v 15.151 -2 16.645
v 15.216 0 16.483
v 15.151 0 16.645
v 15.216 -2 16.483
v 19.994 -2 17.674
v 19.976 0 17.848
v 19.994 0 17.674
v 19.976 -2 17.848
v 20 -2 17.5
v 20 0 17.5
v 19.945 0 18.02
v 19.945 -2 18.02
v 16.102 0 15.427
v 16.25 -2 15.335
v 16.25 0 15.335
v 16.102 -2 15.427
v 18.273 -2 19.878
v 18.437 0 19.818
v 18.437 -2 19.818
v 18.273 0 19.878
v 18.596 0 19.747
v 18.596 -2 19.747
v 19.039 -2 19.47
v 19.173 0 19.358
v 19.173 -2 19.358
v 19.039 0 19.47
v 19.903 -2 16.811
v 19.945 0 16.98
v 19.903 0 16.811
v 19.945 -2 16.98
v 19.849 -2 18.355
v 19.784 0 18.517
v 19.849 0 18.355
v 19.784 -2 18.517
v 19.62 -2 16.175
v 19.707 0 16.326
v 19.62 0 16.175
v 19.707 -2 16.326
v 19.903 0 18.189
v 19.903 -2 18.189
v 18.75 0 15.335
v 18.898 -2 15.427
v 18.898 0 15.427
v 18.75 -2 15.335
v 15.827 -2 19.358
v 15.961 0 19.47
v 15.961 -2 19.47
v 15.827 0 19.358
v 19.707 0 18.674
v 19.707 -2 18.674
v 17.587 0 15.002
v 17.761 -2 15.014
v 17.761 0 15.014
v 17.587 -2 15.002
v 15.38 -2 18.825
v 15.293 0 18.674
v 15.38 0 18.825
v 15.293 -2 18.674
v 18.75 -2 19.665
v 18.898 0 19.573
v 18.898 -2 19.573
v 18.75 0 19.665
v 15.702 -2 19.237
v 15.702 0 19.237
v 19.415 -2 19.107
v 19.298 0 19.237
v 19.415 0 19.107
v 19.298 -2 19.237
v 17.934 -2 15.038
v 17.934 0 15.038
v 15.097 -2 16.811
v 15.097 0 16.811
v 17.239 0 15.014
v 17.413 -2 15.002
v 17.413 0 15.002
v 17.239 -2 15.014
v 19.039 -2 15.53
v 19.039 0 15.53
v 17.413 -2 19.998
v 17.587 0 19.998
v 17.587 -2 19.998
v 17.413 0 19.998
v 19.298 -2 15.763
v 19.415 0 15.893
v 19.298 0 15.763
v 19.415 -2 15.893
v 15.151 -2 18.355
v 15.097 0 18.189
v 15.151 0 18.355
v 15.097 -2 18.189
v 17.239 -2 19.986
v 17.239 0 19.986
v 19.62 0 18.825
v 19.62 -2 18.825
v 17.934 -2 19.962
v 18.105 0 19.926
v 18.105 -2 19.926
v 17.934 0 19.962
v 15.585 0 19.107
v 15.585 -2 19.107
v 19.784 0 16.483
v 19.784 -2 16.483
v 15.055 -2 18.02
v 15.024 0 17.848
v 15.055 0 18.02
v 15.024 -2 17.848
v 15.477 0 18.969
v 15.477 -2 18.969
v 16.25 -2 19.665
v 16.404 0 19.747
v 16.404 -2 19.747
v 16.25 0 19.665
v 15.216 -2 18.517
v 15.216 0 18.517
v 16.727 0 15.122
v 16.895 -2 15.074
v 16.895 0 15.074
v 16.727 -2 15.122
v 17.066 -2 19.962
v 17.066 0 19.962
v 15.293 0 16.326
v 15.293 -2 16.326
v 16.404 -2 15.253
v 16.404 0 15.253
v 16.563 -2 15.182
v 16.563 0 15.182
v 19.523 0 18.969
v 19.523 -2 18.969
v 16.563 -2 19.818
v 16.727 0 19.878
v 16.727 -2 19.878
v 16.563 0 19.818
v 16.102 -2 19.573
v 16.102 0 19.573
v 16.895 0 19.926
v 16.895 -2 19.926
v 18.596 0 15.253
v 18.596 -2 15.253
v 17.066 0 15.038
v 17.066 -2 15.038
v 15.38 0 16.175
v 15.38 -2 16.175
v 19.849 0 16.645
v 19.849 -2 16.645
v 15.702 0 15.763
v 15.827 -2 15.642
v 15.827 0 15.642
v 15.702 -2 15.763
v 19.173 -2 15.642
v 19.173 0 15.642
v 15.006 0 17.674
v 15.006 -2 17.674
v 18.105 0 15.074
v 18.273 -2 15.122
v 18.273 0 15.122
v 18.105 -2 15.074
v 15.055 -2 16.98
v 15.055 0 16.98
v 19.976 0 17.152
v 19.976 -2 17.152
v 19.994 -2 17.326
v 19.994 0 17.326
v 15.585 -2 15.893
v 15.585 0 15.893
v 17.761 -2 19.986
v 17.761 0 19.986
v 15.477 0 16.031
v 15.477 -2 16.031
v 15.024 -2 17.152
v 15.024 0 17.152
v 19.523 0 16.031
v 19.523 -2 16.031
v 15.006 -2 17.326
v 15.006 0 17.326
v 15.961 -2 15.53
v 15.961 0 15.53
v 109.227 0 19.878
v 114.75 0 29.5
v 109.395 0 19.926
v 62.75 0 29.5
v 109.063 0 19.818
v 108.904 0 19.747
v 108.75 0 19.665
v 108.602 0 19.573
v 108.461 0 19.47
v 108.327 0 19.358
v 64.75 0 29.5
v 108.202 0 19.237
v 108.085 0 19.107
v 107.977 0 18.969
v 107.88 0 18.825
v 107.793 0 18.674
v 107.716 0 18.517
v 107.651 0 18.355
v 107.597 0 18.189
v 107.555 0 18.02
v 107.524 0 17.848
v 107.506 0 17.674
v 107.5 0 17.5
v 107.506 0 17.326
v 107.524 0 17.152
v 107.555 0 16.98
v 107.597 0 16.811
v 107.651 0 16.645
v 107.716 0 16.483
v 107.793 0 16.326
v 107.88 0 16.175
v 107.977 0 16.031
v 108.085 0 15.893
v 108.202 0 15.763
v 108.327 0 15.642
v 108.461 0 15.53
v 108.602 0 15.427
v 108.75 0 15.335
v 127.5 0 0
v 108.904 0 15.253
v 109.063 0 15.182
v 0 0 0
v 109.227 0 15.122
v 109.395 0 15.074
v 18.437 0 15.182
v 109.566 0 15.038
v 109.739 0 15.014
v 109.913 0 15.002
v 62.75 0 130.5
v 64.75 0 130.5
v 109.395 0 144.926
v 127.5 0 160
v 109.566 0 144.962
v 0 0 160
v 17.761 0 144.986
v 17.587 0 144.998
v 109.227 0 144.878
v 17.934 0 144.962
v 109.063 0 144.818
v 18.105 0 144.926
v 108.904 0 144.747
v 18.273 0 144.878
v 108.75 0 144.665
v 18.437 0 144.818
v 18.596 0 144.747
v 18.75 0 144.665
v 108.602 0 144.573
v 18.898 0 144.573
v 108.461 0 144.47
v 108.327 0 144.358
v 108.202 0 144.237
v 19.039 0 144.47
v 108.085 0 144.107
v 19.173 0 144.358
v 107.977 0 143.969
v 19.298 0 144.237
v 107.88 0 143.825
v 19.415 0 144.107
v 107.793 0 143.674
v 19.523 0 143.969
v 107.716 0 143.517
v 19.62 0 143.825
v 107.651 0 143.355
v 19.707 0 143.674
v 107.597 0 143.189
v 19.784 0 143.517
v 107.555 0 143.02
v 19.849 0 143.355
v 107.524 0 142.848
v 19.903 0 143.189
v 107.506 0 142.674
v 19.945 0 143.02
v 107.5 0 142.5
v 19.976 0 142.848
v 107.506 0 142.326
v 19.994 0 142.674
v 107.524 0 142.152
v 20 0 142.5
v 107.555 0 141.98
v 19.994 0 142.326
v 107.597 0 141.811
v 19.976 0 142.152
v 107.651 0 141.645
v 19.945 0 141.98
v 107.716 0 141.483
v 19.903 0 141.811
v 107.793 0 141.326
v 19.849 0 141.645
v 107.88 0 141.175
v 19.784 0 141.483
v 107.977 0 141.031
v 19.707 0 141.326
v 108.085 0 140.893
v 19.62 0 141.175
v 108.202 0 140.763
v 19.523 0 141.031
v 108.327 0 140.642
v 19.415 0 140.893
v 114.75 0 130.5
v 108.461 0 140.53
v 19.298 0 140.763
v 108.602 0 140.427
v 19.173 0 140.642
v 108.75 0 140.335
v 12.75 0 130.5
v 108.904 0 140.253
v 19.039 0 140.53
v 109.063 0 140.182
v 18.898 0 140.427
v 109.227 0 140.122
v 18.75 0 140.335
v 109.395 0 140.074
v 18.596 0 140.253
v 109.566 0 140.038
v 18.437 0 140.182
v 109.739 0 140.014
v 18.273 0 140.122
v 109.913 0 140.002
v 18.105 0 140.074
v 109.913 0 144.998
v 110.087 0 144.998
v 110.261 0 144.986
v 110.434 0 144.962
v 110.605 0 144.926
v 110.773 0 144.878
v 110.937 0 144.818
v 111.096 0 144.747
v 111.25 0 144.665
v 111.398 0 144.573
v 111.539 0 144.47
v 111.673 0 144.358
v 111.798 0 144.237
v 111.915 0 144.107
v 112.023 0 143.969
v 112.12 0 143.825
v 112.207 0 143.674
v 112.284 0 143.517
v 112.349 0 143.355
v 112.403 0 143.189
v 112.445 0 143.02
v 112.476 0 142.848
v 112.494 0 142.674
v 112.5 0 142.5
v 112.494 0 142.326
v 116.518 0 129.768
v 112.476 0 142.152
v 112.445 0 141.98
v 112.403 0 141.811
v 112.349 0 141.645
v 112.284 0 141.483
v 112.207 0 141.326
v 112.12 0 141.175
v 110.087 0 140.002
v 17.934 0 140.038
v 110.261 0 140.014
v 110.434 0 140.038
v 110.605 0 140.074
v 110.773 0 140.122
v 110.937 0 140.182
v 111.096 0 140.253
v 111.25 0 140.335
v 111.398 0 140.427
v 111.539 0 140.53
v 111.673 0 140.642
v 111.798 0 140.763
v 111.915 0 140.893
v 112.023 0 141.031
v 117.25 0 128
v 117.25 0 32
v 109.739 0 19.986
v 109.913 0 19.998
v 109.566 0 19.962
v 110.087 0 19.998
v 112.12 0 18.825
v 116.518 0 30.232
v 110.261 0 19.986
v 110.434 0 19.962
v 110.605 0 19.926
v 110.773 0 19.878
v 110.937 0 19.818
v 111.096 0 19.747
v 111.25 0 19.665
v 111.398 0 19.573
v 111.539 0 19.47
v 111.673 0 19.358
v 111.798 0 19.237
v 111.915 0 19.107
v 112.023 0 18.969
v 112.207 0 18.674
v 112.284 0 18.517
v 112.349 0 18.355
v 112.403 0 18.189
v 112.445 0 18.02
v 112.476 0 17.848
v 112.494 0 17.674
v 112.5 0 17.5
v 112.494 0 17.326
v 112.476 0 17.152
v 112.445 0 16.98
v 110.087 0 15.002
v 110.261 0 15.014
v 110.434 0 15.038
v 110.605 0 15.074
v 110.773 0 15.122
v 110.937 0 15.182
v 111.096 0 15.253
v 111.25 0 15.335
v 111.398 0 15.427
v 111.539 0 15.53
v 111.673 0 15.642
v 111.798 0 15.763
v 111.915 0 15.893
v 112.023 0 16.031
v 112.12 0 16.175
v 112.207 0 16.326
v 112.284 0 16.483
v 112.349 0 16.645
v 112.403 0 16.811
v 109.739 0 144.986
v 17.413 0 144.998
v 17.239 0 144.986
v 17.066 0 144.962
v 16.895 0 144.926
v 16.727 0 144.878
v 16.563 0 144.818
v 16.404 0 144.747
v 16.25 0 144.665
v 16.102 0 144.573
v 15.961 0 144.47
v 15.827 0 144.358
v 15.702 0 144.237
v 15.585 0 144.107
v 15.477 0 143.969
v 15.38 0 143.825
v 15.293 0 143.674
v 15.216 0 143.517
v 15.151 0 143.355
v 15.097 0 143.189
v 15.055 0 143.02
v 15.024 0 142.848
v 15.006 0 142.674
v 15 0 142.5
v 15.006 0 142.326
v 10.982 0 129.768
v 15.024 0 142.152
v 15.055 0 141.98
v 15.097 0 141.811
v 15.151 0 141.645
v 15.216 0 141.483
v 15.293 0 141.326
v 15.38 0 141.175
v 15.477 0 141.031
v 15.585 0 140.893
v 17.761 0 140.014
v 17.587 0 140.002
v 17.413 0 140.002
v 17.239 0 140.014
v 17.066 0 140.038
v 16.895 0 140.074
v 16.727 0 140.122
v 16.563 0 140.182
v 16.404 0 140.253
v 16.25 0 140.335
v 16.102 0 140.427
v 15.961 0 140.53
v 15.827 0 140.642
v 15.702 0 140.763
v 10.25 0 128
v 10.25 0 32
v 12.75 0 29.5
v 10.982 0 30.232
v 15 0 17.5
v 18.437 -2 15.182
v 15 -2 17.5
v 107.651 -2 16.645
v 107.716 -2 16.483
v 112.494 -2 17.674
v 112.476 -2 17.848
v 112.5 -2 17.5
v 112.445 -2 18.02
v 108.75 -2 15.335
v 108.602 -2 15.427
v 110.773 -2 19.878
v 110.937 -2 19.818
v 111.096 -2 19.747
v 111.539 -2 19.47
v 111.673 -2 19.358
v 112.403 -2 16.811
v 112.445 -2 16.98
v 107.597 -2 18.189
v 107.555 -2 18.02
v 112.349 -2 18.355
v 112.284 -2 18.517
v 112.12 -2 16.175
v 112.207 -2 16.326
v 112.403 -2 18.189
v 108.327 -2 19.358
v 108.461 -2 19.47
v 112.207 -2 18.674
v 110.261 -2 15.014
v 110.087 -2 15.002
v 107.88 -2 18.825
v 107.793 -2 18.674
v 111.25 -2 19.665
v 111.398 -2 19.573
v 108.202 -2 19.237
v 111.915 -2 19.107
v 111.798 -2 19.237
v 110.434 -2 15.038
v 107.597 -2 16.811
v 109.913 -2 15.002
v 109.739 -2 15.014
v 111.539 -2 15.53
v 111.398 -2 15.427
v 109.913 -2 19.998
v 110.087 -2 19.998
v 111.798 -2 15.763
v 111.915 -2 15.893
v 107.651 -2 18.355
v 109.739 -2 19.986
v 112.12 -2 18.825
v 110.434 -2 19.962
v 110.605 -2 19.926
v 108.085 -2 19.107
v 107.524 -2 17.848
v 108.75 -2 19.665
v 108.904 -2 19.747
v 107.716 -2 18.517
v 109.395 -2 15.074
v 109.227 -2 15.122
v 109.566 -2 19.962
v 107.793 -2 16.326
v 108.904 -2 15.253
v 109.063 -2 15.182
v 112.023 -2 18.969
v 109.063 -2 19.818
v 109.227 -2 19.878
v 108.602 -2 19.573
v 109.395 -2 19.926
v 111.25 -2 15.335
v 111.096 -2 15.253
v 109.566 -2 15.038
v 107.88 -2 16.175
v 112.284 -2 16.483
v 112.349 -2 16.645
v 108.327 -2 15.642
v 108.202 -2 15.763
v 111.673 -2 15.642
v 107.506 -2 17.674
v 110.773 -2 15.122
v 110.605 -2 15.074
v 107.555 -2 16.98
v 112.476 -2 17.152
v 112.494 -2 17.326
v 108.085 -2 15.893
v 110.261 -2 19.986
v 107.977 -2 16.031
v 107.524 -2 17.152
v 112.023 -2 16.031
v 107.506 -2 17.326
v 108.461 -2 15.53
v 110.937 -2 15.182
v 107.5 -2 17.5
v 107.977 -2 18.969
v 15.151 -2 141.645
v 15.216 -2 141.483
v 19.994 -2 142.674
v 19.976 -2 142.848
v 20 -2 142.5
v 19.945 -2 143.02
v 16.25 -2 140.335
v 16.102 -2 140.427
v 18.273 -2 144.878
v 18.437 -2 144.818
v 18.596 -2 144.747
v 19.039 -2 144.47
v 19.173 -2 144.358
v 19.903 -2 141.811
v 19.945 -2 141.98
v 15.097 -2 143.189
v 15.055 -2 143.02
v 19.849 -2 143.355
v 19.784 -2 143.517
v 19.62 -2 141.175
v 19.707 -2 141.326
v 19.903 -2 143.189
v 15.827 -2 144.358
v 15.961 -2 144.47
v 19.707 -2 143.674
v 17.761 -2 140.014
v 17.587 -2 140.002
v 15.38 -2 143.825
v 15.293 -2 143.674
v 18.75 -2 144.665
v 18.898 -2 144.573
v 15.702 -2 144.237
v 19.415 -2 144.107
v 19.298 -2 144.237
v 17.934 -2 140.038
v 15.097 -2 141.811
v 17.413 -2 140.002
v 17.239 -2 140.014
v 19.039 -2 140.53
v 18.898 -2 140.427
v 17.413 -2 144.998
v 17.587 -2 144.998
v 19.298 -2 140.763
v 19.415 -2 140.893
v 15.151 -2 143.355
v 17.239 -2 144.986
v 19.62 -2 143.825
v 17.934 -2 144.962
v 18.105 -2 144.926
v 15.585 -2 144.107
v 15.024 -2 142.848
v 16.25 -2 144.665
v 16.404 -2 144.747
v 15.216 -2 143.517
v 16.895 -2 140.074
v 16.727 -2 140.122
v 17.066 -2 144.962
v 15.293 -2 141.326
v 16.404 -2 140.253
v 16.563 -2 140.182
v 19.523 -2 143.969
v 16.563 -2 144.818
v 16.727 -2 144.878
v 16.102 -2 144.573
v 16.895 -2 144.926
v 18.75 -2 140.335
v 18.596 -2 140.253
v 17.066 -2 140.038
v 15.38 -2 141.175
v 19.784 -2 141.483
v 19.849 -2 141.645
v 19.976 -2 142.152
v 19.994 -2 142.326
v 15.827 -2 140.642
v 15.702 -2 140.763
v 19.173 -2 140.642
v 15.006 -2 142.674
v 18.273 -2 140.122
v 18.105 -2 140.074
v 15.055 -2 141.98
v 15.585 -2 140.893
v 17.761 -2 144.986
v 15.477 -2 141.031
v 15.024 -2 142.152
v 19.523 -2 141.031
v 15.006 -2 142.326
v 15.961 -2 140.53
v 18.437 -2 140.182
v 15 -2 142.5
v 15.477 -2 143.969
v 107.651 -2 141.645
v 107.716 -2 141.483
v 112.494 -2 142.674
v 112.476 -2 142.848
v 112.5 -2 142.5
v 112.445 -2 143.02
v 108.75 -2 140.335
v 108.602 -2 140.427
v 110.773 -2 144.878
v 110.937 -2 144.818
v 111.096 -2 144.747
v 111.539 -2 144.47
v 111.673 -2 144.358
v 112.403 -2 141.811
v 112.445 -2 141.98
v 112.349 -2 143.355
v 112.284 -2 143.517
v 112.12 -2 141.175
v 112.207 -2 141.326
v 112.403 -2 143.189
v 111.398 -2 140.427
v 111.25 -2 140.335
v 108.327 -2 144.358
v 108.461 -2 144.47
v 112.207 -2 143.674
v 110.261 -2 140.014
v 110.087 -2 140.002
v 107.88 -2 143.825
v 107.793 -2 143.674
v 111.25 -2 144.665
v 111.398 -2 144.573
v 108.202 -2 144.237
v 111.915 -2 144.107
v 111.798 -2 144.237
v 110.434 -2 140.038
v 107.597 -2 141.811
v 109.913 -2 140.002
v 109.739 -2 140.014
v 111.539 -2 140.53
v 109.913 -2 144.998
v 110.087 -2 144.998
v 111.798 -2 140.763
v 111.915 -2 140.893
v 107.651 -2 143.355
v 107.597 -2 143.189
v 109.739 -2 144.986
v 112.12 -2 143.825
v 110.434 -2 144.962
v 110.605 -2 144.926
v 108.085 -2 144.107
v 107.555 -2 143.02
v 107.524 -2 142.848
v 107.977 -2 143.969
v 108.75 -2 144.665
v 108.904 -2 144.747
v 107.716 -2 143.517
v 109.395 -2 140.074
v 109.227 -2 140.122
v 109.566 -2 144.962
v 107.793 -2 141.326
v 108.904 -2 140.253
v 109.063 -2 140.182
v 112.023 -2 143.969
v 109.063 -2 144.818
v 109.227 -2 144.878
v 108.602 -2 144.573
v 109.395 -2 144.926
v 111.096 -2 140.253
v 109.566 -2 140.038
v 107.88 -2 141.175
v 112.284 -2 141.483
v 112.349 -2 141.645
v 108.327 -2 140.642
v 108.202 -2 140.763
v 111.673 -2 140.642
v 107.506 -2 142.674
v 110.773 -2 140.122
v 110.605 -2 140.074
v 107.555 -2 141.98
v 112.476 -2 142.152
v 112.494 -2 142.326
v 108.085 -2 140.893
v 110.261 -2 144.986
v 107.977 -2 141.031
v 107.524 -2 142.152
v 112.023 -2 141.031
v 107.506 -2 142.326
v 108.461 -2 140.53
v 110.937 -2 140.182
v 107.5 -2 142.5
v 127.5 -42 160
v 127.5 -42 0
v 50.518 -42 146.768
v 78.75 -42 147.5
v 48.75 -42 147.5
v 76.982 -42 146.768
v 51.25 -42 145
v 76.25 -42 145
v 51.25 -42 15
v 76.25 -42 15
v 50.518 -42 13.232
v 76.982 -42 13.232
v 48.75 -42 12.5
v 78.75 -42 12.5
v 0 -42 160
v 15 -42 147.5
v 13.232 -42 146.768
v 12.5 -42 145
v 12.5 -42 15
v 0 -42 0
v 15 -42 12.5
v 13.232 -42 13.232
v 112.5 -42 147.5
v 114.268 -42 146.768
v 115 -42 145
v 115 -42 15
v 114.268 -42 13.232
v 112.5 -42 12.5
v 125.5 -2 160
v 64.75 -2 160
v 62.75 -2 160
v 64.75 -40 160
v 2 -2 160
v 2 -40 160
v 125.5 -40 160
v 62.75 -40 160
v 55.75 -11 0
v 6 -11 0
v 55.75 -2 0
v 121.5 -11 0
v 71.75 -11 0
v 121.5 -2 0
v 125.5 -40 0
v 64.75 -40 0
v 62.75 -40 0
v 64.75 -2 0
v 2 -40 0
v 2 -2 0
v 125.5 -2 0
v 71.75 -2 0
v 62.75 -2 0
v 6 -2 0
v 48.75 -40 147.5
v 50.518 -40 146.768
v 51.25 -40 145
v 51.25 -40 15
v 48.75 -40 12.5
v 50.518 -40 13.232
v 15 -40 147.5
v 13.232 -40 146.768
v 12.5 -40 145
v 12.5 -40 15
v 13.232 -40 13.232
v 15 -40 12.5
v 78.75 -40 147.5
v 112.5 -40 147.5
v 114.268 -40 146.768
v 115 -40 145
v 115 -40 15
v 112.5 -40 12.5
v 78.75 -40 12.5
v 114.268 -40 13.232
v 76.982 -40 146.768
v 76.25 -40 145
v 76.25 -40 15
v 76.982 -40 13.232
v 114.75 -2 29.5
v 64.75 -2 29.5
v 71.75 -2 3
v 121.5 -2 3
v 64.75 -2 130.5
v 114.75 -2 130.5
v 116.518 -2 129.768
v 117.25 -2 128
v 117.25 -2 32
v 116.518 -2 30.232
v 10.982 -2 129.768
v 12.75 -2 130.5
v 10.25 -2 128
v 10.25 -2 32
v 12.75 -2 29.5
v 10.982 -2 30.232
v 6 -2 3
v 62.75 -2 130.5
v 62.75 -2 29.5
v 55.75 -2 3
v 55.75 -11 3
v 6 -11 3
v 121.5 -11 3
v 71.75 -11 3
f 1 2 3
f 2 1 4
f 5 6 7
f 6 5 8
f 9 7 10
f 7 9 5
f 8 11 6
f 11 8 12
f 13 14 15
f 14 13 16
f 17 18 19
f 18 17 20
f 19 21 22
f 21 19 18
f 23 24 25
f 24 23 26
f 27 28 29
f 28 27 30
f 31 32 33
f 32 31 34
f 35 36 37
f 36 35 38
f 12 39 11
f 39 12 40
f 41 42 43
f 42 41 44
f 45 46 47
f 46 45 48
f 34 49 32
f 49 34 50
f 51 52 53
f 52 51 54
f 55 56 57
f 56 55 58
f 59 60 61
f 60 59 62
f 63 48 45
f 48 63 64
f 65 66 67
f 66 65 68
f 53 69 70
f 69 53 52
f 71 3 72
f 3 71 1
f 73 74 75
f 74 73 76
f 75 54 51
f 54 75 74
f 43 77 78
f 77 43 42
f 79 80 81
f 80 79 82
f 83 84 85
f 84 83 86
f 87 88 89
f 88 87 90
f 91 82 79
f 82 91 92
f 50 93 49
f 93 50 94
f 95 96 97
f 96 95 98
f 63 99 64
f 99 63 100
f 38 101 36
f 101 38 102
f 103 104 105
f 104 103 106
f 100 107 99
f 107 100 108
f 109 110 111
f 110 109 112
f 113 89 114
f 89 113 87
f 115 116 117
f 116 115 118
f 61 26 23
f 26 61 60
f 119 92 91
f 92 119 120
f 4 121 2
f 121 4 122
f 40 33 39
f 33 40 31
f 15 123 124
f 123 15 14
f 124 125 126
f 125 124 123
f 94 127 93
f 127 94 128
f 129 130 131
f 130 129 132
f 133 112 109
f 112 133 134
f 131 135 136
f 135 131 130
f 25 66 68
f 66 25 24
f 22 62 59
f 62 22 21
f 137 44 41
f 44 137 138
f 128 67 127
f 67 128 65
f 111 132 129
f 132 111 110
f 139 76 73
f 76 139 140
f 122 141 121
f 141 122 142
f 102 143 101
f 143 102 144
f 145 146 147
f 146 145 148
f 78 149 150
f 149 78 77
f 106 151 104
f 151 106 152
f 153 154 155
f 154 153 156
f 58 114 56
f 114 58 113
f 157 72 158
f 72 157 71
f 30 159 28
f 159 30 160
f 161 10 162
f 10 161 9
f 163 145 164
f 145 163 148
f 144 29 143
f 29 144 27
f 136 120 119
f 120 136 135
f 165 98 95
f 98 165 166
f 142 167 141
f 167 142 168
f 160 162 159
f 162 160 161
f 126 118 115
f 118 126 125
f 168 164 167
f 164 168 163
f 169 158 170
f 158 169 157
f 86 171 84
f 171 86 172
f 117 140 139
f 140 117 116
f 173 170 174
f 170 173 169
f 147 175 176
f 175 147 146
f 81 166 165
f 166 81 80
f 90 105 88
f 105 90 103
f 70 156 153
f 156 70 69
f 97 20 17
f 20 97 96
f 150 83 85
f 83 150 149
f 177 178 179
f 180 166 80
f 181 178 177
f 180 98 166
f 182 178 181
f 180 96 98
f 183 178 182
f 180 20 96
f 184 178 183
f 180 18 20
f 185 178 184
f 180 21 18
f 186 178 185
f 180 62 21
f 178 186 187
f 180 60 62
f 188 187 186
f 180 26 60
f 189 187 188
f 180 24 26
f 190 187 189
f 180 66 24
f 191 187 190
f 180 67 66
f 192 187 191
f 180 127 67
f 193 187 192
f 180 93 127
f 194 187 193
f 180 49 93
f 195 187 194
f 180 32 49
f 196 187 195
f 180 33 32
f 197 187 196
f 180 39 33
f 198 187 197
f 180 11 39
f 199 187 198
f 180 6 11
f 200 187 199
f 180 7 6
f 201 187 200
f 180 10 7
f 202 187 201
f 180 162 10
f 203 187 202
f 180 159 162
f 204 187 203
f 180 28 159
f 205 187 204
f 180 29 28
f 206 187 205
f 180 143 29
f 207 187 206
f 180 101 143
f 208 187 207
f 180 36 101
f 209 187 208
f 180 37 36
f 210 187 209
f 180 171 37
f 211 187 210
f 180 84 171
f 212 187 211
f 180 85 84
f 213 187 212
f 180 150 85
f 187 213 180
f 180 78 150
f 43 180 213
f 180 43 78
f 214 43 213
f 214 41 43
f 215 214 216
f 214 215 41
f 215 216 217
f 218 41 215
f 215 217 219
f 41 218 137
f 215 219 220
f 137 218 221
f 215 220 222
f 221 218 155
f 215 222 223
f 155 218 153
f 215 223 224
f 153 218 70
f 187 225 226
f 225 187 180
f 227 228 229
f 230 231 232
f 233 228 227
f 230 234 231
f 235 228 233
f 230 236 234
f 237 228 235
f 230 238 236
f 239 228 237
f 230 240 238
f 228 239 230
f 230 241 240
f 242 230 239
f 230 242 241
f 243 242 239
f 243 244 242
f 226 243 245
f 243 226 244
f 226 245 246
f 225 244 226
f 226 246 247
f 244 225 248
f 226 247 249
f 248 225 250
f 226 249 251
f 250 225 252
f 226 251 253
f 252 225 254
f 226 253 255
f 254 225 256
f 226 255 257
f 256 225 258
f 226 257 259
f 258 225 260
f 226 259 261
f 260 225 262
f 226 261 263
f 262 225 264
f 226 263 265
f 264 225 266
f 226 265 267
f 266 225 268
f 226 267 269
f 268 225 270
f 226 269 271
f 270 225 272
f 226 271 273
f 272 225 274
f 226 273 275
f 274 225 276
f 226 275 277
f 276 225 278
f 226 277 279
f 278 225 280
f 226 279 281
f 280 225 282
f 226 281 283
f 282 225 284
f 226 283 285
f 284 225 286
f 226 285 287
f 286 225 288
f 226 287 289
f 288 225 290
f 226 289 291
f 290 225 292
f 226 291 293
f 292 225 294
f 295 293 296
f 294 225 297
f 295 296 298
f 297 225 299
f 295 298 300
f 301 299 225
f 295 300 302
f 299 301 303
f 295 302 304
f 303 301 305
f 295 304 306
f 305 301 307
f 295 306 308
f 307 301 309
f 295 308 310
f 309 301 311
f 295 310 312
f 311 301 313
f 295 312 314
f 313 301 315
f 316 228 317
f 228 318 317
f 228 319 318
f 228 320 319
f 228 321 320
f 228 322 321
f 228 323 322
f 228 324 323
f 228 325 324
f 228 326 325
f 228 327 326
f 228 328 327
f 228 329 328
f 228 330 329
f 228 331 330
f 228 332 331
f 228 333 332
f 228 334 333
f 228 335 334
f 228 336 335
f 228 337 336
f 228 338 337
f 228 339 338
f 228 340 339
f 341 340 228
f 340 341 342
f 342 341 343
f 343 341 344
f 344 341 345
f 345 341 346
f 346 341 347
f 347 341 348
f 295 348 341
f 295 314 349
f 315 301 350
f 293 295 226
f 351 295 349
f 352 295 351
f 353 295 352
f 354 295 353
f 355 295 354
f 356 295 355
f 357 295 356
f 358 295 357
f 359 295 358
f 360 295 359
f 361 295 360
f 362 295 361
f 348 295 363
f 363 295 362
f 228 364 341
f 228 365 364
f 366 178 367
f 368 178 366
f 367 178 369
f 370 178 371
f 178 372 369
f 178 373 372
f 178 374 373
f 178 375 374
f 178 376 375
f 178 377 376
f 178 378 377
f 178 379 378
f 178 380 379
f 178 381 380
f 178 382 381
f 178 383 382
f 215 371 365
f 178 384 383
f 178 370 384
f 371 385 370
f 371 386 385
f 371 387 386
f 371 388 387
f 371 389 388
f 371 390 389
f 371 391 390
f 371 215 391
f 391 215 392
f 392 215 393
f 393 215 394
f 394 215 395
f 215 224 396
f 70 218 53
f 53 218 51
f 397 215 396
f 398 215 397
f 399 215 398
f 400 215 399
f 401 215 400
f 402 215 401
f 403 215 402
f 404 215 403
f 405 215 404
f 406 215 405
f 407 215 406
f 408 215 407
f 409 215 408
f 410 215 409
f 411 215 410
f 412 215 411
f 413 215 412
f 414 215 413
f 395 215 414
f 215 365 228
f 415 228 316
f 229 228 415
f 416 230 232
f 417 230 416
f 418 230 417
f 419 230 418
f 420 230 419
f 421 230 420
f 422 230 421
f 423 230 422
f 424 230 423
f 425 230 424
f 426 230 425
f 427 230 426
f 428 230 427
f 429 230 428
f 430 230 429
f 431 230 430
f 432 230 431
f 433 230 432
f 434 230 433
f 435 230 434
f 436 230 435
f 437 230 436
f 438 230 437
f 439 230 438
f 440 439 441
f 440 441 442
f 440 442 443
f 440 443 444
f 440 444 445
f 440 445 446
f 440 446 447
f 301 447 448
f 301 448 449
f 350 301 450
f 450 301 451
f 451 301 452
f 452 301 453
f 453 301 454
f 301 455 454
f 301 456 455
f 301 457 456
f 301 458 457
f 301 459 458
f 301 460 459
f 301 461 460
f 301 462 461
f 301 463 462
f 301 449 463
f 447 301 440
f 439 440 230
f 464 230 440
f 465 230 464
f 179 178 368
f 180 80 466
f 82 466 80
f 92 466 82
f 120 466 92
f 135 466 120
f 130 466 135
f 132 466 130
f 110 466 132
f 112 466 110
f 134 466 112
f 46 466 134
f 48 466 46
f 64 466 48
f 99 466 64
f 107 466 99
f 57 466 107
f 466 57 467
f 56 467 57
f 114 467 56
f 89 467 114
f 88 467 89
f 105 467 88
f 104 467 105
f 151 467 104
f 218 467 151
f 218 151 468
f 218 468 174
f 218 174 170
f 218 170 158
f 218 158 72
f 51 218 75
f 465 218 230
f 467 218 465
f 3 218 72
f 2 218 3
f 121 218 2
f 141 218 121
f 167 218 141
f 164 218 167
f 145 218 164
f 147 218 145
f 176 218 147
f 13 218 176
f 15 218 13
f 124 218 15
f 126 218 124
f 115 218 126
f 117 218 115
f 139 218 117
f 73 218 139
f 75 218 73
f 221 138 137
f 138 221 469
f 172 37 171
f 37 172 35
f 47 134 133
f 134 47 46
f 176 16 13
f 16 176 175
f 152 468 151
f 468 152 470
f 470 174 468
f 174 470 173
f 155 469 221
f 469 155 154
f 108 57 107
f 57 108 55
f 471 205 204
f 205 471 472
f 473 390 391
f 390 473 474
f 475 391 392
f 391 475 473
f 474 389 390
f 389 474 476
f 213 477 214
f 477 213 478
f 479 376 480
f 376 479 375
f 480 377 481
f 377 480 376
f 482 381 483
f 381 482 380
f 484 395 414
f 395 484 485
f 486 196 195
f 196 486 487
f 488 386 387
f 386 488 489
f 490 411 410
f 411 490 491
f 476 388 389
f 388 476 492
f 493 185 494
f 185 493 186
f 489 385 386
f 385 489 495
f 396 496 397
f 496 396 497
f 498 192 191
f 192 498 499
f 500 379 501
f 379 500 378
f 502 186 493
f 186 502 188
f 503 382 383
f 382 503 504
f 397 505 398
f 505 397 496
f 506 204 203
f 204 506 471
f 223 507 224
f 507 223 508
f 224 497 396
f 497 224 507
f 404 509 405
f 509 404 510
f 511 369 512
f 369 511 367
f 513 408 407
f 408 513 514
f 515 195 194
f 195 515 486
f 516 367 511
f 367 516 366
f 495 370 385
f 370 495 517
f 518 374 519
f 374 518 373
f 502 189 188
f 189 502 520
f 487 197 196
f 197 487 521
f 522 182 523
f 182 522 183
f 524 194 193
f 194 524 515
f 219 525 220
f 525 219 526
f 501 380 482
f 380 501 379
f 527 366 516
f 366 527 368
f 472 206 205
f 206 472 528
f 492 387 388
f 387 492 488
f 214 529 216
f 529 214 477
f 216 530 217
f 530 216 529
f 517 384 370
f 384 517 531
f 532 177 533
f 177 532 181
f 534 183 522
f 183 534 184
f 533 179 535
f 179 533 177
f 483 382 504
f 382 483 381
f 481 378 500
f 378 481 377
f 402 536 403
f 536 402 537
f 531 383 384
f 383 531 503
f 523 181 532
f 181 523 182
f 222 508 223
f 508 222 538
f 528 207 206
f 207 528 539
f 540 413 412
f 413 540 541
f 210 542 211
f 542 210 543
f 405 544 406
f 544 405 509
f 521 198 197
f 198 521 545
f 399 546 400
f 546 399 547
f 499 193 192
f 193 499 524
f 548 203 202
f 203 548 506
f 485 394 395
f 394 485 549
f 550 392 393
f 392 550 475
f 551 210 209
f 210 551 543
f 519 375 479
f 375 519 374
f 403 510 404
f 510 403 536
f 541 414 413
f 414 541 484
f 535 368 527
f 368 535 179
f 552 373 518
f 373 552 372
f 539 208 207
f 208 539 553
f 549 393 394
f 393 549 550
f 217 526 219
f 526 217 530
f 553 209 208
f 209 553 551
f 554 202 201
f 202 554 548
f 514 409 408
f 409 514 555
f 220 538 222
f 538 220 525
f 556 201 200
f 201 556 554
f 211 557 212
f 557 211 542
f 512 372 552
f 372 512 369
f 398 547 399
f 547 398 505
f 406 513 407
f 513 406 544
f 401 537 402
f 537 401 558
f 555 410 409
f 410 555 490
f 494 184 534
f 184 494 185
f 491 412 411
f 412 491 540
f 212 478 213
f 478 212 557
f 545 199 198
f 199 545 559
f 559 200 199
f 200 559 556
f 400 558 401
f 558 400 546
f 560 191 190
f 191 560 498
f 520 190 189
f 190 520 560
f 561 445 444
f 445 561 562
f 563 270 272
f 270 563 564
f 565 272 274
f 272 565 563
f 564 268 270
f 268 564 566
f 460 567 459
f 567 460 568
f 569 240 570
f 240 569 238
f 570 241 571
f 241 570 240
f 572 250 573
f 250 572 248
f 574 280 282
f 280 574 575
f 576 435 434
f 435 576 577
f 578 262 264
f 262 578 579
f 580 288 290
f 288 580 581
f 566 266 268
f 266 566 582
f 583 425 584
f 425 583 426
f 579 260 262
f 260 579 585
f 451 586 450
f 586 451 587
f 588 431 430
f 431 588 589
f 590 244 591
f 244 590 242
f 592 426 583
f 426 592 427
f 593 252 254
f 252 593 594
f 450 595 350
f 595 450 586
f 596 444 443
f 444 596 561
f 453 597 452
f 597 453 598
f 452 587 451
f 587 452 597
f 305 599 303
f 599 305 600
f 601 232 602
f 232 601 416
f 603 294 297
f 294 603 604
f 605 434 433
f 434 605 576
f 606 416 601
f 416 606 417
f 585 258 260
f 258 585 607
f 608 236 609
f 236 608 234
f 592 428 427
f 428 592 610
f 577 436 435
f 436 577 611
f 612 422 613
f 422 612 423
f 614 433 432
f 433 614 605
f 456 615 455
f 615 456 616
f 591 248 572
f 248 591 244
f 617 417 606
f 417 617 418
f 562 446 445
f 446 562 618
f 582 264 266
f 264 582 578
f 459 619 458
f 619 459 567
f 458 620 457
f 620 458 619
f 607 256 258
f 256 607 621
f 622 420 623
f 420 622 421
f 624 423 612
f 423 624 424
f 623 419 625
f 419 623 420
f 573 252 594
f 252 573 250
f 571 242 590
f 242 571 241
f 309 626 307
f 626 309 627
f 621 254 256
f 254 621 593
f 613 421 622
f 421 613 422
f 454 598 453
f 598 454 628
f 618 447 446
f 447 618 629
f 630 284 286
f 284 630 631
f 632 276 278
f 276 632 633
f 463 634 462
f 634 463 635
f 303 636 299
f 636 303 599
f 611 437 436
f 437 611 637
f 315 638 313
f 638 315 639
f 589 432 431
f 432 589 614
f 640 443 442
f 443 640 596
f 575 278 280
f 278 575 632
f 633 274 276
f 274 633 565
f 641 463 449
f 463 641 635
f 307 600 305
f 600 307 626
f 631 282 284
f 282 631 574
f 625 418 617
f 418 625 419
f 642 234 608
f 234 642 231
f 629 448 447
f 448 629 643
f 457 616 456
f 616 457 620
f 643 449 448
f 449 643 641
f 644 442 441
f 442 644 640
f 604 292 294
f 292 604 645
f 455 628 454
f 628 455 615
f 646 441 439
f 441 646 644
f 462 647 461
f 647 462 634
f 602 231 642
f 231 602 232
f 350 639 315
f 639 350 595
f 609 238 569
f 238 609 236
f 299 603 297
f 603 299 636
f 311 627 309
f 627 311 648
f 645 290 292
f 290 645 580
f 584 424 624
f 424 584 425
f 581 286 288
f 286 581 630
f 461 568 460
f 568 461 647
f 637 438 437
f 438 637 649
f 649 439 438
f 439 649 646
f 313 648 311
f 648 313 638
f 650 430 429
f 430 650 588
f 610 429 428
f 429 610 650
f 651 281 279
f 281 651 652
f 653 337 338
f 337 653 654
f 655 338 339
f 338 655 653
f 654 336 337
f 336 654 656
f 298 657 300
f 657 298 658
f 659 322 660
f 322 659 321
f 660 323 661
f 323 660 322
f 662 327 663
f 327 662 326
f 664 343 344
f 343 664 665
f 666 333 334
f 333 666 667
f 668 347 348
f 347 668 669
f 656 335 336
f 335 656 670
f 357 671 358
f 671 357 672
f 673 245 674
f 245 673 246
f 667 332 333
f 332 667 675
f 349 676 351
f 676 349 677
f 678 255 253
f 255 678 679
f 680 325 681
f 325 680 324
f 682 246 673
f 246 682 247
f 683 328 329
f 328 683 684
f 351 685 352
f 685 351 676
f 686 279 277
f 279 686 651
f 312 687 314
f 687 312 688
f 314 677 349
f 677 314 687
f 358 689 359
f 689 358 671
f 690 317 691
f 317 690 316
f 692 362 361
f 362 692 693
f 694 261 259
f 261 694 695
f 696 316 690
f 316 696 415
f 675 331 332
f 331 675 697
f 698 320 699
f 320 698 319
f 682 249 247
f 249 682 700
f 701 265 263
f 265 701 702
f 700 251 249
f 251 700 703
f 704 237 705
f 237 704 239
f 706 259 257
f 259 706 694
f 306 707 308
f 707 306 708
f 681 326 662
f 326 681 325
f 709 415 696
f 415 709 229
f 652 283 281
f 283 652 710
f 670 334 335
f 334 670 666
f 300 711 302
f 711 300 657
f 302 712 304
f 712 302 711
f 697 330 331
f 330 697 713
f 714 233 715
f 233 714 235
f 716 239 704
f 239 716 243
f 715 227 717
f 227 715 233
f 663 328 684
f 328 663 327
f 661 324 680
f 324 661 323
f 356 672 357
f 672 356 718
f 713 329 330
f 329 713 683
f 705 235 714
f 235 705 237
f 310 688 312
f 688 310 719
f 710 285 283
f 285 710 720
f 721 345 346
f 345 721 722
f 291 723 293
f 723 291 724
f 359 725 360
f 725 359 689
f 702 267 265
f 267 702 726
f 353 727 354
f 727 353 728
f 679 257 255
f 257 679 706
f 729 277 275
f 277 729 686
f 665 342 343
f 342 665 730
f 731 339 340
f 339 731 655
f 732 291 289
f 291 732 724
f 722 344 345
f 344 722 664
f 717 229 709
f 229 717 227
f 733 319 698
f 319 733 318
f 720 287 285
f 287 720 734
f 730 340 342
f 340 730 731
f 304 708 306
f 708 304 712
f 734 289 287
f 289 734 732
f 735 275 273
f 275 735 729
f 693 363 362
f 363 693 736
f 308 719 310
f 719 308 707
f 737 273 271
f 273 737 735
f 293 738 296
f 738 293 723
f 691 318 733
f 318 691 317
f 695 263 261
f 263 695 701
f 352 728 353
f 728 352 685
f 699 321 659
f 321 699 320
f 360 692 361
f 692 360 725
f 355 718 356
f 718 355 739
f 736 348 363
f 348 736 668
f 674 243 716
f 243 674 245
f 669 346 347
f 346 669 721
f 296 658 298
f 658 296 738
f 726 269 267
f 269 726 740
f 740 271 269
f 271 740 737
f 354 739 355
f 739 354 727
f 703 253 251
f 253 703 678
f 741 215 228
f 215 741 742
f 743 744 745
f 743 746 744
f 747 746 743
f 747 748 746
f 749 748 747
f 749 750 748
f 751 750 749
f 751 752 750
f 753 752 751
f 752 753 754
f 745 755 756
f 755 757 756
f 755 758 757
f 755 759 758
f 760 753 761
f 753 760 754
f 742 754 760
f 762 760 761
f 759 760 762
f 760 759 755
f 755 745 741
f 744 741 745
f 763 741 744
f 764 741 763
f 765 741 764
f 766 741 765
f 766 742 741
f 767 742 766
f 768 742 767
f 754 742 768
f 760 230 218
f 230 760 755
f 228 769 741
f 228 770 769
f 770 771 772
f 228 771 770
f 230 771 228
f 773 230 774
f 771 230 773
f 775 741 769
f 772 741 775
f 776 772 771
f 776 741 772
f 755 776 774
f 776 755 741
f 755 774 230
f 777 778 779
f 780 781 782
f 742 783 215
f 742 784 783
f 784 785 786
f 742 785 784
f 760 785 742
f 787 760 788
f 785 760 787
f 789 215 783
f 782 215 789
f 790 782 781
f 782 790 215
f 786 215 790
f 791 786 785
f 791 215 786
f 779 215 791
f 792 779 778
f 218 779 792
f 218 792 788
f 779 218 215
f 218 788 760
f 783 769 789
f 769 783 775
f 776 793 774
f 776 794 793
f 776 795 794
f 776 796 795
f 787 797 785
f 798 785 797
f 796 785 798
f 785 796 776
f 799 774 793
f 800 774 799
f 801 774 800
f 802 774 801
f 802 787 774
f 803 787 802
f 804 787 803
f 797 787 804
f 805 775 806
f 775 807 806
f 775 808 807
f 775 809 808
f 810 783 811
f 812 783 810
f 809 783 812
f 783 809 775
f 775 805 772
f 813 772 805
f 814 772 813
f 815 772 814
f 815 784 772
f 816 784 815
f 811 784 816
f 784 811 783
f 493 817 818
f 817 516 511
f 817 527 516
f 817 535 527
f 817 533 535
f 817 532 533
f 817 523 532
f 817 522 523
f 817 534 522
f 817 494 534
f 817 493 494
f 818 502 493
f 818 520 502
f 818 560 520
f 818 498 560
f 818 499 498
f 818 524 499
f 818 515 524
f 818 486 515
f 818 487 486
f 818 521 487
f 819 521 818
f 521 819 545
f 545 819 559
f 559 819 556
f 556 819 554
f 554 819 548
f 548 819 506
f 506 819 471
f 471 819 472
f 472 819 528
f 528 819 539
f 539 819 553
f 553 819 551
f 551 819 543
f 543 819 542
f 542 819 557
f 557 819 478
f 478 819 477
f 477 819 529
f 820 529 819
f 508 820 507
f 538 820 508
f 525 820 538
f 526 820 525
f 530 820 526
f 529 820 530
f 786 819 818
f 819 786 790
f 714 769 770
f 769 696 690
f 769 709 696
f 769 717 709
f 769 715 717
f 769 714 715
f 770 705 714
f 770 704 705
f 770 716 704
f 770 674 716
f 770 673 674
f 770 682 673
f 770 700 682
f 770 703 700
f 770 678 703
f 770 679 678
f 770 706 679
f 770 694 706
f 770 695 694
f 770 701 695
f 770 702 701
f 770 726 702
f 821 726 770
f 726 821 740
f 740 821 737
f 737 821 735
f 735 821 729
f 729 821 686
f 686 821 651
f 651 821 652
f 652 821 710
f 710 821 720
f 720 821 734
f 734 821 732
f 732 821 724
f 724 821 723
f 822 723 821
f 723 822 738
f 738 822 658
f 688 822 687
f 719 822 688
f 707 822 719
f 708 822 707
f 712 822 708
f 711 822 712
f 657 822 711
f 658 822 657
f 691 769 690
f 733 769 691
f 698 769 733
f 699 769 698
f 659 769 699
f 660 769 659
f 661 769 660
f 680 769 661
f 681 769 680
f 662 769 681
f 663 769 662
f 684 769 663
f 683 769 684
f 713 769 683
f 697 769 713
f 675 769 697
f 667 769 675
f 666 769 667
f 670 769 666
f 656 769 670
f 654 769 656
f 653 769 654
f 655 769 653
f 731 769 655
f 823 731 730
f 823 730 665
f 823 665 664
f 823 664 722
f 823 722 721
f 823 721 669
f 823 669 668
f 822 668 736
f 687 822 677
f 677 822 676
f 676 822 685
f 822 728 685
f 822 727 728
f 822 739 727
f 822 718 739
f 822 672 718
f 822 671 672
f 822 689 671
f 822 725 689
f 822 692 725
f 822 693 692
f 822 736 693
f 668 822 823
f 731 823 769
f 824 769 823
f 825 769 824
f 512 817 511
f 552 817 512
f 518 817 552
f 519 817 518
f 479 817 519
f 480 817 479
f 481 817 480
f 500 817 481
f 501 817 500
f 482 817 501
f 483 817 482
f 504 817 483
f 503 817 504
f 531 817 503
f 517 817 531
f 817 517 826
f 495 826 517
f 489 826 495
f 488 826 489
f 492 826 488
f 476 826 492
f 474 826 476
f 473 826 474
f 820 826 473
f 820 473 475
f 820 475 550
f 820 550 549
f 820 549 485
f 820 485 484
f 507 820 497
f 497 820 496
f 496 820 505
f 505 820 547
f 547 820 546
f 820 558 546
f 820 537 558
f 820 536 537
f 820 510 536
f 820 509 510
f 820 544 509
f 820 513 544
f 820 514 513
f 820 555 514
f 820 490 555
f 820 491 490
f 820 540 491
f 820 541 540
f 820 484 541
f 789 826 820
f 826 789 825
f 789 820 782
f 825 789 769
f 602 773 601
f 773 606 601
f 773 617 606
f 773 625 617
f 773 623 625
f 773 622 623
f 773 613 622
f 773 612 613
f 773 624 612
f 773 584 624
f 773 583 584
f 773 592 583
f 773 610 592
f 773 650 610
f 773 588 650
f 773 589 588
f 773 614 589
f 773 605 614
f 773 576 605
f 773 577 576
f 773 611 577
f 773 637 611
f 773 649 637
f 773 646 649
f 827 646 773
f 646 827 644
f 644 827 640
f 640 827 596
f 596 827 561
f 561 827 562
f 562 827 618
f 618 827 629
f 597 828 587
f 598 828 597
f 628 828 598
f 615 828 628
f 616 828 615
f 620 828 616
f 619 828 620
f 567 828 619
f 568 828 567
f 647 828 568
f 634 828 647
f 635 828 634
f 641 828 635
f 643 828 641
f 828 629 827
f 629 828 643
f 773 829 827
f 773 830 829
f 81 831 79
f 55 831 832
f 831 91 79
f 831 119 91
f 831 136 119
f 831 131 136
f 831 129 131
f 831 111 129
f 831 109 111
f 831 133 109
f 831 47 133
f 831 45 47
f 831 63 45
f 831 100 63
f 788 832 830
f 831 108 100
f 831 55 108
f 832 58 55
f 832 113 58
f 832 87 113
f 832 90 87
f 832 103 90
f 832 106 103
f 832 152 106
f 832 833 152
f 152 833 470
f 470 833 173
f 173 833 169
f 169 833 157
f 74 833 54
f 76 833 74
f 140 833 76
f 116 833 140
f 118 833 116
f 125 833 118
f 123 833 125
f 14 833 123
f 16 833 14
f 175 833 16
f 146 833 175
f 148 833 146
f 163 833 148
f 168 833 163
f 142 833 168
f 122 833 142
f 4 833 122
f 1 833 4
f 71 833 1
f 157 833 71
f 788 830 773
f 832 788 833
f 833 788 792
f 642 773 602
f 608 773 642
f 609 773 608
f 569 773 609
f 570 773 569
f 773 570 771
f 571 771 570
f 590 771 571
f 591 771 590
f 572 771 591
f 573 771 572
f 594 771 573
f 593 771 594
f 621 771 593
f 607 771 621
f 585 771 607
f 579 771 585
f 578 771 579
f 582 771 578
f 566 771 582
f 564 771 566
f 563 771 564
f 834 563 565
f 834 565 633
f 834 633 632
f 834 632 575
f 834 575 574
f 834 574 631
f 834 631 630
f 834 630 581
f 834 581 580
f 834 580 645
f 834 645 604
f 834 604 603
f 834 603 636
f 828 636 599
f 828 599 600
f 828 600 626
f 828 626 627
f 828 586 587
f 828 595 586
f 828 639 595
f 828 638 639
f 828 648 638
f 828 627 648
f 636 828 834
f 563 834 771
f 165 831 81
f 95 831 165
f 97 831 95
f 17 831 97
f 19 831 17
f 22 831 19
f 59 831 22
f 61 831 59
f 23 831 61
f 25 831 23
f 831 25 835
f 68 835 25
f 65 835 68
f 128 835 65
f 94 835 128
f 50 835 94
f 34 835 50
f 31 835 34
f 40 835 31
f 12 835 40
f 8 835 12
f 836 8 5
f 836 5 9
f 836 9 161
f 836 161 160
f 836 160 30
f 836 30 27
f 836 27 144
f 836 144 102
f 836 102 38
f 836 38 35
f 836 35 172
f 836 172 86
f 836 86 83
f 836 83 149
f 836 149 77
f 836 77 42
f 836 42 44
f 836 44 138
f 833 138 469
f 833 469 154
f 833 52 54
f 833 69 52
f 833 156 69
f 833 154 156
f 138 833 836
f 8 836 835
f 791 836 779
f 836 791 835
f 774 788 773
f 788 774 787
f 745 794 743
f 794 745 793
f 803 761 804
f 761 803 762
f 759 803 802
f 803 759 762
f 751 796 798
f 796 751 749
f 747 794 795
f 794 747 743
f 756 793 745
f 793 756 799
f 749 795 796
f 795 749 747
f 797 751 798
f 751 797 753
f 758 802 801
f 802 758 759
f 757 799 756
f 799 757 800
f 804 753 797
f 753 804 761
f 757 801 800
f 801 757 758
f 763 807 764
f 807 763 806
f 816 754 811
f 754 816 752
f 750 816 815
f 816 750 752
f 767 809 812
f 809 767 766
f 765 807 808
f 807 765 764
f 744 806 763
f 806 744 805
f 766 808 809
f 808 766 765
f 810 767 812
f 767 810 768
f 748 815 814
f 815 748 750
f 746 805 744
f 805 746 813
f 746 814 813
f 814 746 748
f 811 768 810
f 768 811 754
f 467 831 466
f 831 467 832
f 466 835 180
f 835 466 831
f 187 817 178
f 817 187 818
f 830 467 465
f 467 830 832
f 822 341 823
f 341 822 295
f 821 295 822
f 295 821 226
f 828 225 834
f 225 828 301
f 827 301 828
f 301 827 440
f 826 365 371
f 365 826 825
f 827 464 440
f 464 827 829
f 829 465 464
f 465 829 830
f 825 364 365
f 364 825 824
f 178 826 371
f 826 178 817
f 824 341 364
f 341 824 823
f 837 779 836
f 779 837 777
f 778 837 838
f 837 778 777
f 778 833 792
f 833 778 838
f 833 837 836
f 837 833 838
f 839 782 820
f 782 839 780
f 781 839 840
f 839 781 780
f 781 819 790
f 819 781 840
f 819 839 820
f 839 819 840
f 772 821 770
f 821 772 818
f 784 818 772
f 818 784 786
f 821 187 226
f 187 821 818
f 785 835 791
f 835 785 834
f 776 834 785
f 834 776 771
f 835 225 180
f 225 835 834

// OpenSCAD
wall=2;
depth=160;
hole_d = 5;
hole_spacing = 92.5;
hole_offset = 15+hole_d/2;
width = hole_offset*2+hole_spacing;
height=31+wall*3+5;
box_width = width/2-wall*2;
box_height = height - wall*2-1;
echo(height);
echo(box_height);

//desk_box();
desk_frame();

module desk_box() {
    difference() {
        cube([box_width, depth, box_height]);
        translate([wall,wall,wall]) cube([box_width-2*wall, depth-2*wall, box_height]);
    }
    translate([box_width,.0001,0]) rotate([90,0,-90]) box_brace();
}

module box_brace() {
    difference() {
        linear_extrude(height=box_width) polygon(points=[[0,0],[0,box_height-6],[8,box_height-6],[0,0]]);
        translate([0,0,wall]) linear_extrude(height=box_width-wall*2) polygon(points=[[0,0],[0,box_height-6],[8,box_height-6],[0,0]]);
    }
    translate([0,box_height-6,0]) difference() {
        cube([8,6,box_width]);
        translate([0,0,wall]) cube([6,4,box_width-wall*2]);
    }
}

module desk_frame() {
    rotate([1*90,0,0]) union(){
        difference() {
            cube([width,depth,height]);
            translate([wall,0,wall]) cube([width-wall*2,depth,height-wall*2]);
            translate([0,0,0]) {
                translate([hole_offset,hole_offset,0]) cylinder(d=5,h=10,$fn=90);
                translate([width-hole_offset,hole_offset,0]) cylinder(d=5,h=10,$fn=90);
                translate([hole_offset,depth-hole_offset,0]) cylinder(d=5,h=10,$fn=90);
                translate([width-hole_offset,depth-hole_offset,0]) cylinder(d=5,h=10,$fn=90);
            }

            translate([hole_offset-2.5,hole_offset-2.5,height-3])lower_cut();
            translate([width-hole_spacing/2-2.5,hole_offset-2.5,height-3])lower_cut();
            upper_cut();
        }

        stoppers = (width-wall*2)/2-wall*6;
        translate([wall*3,0,0]) cube([stoppers,3,wall*3+5]);
        translate([width-wall*3-stoppers,0,0]) cube([stoppers,3,wall*3+5]);
        translate([width/2-wall/2,0,0]) cube([wall,depth,height]);
    }
}

module lower_cut() {
    linear_extrude(height=5) {
        w = hole_spacing/2-hole_offset+5;
        d = depth-hole_offset*2+5;
        hull() {
            circle(d=5);
            translate([w,0,0]) circle(d=5);
            translate([0,d,0]) circle(d=5);
            translate([w,d,0]) circle(d=5);
        }
    }
}

module upper_cut() {
    translate([width*.1,depth*.2,0]) linear_extrude(height=5) {
        w = width*.8;
        d = depth*.6;
        hull() {
            circle(d=5);
            translate([w,0,0]) circle(d=5);
            translate([0,d,0]) circle(d=5);
            translate([w,d,0]) circle(d=5);
        }
    }
}
